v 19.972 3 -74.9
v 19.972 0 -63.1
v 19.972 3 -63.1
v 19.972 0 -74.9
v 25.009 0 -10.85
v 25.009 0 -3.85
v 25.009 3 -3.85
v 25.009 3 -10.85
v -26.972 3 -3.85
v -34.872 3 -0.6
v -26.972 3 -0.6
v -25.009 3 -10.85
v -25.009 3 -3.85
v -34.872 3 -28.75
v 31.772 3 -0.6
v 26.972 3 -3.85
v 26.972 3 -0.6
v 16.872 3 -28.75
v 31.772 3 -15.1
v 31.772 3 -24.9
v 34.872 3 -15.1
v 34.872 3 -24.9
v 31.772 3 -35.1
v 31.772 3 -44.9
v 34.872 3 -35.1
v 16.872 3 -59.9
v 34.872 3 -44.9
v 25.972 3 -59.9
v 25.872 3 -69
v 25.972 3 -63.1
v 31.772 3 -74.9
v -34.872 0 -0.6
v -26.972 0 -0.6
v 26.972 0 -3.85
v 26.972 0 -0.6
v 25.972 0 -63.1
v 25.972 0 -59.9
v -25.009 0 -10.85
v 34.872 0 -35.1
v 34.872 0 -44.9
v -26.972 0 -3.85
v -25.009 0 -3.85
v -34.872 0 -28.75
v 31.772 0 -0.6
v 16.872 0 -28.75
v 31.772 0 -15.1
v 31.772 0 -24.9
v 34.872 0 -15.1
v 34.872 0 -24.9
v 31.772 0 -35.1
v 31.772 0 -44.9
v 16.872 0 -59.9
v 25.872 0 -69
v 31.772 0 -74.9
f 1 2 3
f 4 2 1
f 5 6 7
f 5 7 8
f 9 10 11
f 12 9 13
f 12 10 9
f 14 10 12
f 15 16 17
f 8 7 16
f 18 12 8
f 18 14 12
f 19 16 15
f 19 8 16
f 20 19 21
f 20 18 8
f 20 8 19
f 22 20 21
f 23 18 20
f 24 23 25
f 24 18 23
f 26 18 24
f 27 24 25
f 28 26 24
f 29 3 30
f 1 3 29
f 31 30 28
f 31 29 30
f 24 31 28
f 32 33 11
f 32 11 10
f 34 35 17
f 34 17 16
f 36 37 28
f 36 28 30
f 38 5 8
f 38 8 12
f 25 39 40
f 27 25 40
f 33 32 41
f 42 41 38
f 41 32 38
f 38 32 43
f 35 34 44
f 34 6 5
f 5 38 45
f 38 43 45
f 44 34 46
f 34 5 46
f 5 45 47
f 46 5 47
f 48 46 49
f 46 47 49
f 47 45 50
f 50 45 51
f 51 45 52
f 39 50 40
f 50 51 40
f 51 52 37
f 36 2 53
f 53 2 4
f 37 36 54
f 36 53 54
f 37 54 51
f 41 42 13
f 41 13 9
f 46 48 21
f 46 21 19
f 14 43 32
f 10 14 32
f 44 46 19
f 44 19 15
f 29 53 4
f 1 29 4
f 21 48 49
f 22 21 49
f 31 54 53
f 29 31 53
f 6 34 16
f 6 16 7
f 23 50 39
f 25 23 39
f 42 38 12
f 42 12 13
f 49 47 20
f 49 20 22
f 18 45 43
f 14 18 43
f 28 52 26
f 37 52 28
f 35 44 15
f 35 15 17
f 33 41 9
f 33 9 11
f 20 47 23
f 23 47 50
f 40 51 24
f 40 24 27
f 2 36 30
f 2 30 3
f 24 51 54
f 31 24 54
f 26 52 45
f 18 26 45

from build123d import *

# Parameters (mm, degrees)
BOSS_EXTRUDE1_DEPTH = 3
SKETCH6_W           = 3.2
SKETCH6_H           = 30.2
SKETCH6_H_2         = 10.2
CUT_EXTRUDE3_DEPTH  = 4


with BuildPart() as part:
    # Sketch1 → Boss-Extrude1 (new body)
    with BuildSketch(Plane(origin=(0, 0, 0), x_dir=(1, 0, 0), z_dir=(0, 1, 0))):
        Polygon((-34.872217102, 0), (34.872217102, 0), (34.872217102, 75), (31.872217102, 75), (25.872217102, 69), (19.872217102, 75), (16.872217102, 75), (16.872217102, 28.75), (-34.872217102, 28.75), align=None)
    extrude(amount=BOSS_EXTRUDE1_DEPTH)

    # Sketch6 → Cut-Extrude3 (cut, through all)
    with BuildSketch(Plane(origin=(0, 0, 0), x_dir=(1, 0, 0), z_dir=(0, 1, 0))):
        with Locations((33.372217102, 60)):
            Rectangle(SKETCH6_W, SKETCH6_H)
        with Locations((33.372217102, 30)):
            Rectangle(SKETCH6_W, SKETCH6_H_2)
        Polygon((25.972217102, 63.1), (19.972217102, 63.1), (19.972217102, 75.1), (16.772217102, 75.1), (16.772217102, 59.9), (25.972217102, 59.9), align=None)
        Polygon((34.972217102, -0.1), (34.972217102, 15.1), (31.772217102, 15.1), (31.772217102, 0.6), (26.972217102, 0.6), (26.972217102, 3.85), (25.008726501, 3.85), (25.008726501, 10.85), (-25.008726501, 10.85), (-25.008726501, 3.85), (-26.972217102, 3.85), (-26.972217102, 0.6), (-34.972217102, 0.6), (-34.972217102, -0.1), align=None)
    extrude(amount=CUT_EXTRUDE3_DEPTH, mode=Mode.SUBTRACT)


solid = part.part
